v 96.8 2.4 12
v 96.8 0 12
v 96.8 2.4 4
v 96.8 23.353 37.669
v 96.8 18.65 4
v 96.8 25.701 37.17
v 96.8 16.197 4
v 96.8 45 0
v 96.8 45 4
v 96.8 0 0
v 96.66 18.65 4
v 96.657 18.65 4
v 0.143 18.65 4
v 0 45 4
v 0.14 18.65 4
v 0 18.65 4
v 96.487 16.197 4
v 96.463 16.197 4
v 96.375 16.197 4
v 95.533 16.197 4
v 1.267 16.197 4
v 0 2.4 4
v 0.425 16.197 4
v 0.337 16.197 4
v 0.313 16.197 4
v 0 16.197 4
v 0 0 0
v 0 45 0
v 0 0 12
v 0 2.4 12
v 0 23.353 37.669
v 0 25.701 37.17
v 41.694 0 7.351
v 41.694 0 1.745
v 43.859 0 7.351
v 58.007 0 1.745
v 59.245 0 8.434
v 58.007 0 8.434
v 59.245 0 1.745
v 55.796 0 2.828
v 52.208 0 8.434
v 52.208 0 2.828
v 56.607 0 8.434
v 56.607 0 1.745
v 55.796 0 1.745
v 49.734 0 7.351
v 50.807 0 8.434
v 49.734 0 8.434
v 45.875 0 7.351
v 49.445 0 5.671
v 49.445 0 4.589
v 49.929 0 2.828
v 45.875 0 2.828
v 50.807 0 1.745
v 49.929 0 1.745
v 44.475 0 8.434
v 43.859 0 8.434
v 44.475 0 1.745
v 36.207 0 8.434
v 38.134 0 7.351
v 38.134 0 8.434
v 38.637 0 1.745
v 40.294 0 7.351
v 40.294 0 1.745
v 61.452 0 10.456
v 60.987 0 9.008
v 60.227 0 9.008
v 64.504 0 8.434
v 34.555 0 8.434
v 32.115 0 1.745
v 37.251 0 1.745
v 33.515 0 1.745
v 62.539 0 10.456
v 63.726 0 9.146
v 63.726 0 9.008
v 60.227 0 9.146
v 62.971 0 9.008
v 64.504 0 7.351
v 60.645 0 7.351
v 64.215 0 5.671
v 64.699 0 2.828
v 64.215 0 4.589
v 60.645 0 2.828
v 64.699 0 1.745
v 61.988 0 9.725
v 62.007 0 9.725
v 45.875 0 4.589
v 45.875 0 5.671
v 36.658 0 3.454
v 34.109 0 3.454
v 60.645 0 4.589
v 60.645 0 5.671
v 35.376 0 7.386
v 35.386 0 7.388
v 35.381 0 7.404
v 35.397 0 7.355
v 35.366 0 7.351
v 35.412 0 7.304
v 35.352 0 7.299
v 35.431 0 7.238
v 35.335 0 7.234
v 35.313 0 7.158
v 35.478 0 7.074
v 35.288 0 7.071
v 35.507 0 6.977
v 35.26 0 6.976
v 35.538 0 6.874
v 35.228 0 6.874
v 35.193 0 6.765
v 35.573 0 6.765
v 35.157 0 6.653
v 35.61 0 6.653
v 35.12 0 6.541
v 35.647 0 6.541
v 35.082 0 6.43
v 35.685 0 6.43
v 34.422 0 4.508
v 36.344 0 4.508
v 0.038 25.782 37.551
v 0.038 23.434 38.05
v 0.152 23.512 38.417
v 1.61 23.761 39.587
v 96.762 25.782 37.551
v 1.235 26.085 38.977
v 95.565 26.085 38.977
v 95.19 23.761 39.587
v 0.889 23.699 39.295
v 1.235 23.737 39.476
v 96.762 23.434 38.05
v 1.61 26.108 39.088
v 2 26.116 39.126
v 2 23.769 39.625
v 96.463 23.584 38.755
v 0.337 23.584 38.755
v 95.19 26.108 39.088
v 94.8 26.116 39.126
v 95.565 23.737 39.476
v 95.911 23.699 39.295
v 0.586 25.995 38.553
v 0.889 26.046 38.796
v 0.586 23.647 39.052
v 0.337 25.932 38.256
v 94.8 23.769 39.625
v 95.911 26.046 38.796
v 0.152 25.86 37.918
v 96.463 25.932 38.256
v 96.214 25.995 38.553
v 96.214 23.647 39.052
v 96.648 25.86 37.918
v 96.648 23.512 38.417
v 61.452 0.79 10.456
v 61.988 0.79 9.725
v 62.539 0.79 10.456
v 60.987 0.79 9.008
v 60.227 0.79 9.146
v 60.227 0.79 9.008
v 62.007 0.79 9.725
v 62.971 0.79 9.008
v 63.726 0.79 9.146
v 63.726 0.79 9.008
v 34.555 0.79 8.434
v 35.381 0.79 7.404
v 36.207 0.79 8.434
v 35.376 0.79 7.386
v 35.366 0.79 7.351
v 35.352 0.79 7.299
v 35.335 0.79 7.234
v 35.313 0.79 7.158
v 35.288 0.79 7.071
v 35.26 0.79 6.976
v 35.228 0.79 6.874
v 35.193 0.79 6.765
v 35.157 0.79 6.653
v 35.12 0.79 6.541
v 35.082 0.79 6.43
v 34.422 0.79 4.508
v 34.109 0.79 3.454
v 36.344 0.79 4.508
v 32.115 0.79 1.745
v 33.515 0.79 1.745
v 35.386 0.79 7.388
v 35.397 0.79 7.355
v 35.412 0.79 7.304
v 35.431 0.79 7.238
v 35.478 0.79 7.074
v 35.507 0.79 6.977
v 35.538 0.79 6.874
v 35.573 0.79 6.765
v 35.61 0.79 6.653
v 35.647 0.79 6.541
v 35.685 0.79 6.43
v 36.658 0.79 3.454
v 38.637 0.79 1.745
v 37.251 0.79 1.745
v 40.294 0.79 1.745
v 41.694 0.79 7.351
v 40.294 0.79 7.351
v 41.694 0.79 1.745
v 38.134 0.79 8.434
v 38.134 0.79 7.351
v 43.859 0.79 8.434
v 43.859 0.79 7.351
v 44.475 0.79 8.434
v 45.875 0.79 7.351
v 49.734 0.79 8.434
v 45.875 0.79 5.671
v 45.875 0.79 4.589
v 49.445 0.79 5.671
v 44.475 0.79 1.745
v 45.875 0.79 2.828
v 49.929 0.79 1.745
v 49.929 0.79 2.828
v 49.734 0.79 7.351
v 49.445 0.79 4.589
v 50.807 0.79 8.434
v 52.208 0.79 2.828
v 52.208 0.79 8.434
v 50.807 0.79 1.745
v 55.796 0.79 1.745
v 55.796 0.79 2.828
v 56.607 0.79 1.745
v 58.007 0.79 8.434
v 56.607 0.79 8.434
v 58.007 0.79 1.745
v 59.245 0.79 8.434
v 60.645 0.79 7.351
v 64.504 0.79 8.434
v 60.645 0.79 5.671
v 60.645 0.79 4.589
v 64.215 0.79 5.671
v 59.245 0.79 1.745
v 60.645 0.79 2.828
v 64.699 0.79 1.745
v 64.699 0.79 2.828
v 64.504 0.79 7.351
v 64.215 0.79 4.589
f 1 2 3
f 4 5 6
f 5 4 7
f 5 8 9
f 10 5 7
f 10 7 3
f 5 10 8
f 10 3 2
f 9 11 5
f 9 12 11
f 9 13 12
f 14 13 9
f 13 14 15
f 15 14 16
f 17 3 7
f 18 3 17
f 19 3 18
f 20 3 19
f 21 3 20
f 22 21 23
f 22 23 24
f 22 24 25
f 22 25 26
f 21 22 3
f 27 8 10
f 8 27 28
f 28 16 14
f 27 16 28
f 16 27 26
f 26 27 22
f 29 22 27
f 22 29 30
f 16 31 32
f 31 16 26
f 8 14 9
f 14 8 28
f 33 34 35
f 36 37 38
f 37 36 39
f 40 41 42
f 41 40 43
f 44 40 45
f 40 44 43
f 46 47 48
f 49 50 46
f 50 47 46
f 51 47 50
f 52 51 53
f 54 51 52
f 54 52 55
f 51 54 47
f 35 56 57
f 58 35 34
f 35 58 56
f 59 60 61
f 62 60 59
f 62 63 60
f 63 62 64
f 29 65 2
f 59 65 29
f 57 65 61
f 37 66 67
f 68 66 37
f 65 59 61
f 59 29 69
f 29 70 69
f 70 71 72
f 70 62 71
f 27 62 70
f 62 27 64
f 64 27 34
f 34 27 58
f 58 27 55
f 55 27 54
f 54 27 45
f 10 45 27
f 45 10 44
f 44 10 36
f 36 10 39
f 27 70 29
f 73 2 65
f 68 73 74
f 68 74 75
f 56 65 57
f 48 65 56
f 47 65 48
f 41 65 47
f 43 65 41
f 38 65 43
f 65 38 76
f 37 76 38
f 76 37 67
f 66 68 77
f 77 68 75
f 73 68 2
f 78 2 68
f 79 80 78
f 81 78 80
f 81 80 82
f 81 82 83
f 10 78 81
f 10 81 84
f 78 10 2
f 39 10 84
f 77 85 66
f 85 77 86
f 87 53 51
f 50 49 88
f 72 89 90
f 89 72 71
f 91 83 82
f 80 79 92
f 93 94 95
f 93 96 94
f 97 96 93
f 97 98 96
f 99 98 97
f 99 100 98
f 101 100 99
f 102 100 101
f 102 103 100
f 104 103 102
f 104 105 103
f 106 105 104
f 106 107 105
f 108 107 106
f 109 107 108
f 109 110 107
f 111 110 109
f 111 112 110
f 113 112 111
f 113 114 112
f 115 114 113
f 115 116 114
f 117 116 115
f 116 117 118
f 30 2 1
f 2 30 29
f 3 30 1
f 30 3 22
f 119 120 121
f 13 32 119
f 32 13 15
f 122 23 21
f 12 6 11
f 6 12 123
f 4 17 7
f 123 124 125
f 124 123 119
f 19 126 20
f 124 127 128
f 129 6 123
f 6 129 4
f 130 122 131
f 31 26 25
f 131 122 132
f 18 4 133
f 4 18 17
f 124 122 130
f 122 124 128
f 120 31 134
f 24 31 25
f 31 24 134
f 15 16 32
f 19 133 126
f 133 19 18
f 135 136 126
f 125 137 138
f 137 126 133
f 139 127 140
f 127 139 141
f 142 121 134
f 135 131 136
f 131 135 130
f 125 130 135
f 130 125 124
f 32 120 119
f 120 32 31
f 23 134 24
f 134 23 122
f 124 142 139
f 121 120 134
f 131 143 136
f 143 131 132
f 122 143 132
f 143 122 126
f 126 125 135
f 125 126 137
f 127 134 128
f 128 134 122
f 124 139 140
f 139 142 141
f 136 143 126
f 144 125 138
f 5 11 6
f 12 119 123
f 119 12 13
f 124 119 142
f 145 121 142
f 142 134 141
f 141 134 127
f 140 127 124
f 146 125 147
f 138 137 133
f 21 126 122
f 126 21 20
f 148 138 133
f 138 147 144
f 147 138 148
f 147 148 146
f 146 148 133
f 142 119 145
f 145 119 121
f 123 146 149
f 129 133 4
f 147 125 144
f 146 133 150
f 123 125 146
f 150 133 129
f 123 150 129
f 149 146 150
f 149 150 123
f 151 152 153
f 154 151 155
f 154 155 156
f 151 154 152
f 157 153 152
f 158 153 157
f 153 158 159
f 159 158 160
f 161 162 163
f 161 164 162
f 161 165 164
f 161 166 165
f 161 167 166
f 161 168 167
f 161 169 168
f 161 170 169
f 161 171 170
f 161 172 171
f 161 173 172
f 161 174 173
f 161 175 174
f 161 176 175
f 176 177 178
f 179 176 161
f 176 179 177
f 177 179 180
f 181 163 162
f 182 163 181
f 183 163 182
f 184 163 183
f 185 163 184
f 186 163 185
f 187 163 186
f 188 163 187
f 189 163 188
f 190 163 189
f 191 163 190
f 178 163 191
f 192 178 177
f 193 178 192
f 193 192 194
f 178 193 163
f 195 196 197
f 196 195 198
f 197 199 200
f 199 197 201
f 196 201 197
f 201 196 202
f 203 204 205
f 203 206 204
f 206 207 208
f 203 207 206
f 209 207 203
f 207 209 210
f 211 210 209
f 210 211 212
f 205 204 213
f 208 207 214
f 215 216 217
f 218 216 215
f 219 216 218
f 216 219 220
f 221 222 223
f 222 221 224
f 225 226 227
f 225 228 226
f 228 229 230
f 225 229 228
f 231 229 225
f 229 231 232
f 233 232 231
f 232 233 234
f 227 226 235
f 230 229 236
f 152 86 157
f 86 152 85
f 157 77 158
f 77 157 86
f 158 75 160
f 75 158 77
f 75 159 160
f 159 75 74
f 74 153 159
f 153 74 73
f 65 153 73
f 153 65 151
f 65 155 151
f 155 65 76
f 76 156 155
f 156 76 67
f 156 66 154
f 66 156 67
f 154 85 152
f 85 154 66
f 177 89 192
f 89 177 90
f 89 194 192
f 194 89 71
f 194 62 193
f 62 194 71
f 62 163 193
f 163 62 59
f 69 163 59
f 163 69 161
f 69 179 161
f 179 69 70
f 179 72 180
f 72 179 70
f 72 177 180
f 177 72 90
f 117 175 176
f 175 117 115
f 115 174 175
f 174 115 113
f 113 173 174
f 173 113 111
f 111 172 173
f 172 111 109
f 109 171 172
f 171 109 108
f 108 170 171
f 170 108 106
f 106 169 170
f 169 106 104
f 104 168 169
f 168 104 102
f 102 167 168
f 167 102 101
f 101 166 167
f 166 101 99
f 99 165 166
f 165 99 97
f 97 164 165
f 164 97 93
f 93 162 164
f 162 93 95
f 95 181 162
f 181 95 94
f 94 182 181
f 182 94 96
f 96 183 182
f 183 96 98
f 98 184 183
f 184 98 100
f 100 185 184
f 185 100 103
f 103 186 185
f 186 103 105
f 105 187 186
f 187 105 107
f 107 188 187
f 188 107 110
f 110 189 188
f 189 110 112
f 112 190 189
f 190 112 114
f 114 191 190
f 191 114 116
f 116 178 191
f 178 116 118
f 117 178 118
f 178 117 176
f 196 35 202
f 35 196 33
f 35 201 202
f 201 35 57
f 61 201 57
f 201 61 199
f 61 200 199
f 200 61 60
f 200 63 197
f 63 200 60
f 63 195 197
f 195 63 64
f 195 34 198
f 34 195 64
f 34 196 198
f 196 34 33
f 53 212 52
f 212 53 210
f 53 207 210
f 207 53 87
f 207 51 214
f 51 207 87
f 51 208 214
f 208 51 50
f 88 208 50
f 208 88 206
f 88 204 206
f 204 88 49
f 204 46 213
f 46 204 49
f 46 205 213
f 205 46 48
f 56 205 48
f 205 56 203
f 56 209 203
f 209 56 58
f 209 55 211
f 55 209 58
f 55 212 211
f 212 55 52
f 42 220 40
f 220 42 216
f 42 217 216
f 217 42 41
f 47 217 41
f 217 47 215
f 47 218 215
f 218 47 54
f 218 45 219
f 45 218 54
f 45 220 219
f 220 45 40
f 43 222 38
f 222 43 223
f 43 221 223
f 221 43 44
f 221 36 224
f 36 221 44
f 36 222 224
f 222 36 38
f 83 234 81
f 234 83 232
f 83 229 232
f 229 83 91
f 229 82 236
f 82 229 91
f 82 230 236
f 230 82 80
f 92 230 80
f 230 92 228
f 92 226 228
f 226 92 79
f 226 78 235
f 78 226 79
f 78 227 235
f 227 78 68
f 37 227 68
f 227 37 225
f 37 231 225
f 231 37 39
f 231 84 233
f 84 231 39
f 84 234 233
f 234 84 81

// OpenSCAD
// Porta-cartão de mesa - impressão 3D
card_w = 90;         // largura do cartão (mm)
card_h = 50;         // altura do cartão (mm)
stack = 12;          // espessura da pilha de cartões (mm)
wall = 2.4;          // espessura das paredes (mm)
clearance = 1;       // folga para os cartões (mm)
tilt = 12;           // inclinação do encosto (graus)
base_d = 45;         // profundidade da base (mm)
base_h = 4;          // altura da base (mm)
lip_h = 12;          // altura da aba da frente (mm)
back_h = 40;         // altura do encosto (mm)
word = "ATELIÊ";     // texto gravado
font_size = 7;       // altura da letra (mm)
engrave = 0.8;       // profundidade da gravação (mm)

body_w = card_w + 2 * clearance + 2 * wall;
pocket = stack + clearance;
module rounded_plate(size, r) {
    // placa de espessura size[1] em Y, com cantos de raio r no plano X-Z
    hull()
        for (x = [r, size[0] - r], z = [r, size[2] - r])
            translate([x, 0, z])
                rotate([-90, 0, 0])
                    cylinder(r = r, h = size[1], $fn = 32);
}

difference() {
    union() {
        cube([body_w, base_d, base_h]);
        cube([body_w, wall, lip_h]);
        translate([0, wall + pocket + wall, 0])
            rotate([-tilt, 0, 0])
                translate([0, -wall, 0])
                    rounded_plate([body_w, wall, back_h], 2);
    }
    translate([body_w / 2, -0.01, lip_h / 2])
        rotate([90, 0, 0])
            translate([0, 0, -engrave])
                linear_extrude(engrave + 0.01)
                    text(word, size = font_size, font = "Liberation Sans:style=Bold",
                         halign = "center", valign = "center");
}

echo(str("Largura: ", body_w, " mm"));
echo(str("Profundidade: ", base_d, " mm"));
echo(str("Altura: ", back_h * cos(tilt), " mm"));
